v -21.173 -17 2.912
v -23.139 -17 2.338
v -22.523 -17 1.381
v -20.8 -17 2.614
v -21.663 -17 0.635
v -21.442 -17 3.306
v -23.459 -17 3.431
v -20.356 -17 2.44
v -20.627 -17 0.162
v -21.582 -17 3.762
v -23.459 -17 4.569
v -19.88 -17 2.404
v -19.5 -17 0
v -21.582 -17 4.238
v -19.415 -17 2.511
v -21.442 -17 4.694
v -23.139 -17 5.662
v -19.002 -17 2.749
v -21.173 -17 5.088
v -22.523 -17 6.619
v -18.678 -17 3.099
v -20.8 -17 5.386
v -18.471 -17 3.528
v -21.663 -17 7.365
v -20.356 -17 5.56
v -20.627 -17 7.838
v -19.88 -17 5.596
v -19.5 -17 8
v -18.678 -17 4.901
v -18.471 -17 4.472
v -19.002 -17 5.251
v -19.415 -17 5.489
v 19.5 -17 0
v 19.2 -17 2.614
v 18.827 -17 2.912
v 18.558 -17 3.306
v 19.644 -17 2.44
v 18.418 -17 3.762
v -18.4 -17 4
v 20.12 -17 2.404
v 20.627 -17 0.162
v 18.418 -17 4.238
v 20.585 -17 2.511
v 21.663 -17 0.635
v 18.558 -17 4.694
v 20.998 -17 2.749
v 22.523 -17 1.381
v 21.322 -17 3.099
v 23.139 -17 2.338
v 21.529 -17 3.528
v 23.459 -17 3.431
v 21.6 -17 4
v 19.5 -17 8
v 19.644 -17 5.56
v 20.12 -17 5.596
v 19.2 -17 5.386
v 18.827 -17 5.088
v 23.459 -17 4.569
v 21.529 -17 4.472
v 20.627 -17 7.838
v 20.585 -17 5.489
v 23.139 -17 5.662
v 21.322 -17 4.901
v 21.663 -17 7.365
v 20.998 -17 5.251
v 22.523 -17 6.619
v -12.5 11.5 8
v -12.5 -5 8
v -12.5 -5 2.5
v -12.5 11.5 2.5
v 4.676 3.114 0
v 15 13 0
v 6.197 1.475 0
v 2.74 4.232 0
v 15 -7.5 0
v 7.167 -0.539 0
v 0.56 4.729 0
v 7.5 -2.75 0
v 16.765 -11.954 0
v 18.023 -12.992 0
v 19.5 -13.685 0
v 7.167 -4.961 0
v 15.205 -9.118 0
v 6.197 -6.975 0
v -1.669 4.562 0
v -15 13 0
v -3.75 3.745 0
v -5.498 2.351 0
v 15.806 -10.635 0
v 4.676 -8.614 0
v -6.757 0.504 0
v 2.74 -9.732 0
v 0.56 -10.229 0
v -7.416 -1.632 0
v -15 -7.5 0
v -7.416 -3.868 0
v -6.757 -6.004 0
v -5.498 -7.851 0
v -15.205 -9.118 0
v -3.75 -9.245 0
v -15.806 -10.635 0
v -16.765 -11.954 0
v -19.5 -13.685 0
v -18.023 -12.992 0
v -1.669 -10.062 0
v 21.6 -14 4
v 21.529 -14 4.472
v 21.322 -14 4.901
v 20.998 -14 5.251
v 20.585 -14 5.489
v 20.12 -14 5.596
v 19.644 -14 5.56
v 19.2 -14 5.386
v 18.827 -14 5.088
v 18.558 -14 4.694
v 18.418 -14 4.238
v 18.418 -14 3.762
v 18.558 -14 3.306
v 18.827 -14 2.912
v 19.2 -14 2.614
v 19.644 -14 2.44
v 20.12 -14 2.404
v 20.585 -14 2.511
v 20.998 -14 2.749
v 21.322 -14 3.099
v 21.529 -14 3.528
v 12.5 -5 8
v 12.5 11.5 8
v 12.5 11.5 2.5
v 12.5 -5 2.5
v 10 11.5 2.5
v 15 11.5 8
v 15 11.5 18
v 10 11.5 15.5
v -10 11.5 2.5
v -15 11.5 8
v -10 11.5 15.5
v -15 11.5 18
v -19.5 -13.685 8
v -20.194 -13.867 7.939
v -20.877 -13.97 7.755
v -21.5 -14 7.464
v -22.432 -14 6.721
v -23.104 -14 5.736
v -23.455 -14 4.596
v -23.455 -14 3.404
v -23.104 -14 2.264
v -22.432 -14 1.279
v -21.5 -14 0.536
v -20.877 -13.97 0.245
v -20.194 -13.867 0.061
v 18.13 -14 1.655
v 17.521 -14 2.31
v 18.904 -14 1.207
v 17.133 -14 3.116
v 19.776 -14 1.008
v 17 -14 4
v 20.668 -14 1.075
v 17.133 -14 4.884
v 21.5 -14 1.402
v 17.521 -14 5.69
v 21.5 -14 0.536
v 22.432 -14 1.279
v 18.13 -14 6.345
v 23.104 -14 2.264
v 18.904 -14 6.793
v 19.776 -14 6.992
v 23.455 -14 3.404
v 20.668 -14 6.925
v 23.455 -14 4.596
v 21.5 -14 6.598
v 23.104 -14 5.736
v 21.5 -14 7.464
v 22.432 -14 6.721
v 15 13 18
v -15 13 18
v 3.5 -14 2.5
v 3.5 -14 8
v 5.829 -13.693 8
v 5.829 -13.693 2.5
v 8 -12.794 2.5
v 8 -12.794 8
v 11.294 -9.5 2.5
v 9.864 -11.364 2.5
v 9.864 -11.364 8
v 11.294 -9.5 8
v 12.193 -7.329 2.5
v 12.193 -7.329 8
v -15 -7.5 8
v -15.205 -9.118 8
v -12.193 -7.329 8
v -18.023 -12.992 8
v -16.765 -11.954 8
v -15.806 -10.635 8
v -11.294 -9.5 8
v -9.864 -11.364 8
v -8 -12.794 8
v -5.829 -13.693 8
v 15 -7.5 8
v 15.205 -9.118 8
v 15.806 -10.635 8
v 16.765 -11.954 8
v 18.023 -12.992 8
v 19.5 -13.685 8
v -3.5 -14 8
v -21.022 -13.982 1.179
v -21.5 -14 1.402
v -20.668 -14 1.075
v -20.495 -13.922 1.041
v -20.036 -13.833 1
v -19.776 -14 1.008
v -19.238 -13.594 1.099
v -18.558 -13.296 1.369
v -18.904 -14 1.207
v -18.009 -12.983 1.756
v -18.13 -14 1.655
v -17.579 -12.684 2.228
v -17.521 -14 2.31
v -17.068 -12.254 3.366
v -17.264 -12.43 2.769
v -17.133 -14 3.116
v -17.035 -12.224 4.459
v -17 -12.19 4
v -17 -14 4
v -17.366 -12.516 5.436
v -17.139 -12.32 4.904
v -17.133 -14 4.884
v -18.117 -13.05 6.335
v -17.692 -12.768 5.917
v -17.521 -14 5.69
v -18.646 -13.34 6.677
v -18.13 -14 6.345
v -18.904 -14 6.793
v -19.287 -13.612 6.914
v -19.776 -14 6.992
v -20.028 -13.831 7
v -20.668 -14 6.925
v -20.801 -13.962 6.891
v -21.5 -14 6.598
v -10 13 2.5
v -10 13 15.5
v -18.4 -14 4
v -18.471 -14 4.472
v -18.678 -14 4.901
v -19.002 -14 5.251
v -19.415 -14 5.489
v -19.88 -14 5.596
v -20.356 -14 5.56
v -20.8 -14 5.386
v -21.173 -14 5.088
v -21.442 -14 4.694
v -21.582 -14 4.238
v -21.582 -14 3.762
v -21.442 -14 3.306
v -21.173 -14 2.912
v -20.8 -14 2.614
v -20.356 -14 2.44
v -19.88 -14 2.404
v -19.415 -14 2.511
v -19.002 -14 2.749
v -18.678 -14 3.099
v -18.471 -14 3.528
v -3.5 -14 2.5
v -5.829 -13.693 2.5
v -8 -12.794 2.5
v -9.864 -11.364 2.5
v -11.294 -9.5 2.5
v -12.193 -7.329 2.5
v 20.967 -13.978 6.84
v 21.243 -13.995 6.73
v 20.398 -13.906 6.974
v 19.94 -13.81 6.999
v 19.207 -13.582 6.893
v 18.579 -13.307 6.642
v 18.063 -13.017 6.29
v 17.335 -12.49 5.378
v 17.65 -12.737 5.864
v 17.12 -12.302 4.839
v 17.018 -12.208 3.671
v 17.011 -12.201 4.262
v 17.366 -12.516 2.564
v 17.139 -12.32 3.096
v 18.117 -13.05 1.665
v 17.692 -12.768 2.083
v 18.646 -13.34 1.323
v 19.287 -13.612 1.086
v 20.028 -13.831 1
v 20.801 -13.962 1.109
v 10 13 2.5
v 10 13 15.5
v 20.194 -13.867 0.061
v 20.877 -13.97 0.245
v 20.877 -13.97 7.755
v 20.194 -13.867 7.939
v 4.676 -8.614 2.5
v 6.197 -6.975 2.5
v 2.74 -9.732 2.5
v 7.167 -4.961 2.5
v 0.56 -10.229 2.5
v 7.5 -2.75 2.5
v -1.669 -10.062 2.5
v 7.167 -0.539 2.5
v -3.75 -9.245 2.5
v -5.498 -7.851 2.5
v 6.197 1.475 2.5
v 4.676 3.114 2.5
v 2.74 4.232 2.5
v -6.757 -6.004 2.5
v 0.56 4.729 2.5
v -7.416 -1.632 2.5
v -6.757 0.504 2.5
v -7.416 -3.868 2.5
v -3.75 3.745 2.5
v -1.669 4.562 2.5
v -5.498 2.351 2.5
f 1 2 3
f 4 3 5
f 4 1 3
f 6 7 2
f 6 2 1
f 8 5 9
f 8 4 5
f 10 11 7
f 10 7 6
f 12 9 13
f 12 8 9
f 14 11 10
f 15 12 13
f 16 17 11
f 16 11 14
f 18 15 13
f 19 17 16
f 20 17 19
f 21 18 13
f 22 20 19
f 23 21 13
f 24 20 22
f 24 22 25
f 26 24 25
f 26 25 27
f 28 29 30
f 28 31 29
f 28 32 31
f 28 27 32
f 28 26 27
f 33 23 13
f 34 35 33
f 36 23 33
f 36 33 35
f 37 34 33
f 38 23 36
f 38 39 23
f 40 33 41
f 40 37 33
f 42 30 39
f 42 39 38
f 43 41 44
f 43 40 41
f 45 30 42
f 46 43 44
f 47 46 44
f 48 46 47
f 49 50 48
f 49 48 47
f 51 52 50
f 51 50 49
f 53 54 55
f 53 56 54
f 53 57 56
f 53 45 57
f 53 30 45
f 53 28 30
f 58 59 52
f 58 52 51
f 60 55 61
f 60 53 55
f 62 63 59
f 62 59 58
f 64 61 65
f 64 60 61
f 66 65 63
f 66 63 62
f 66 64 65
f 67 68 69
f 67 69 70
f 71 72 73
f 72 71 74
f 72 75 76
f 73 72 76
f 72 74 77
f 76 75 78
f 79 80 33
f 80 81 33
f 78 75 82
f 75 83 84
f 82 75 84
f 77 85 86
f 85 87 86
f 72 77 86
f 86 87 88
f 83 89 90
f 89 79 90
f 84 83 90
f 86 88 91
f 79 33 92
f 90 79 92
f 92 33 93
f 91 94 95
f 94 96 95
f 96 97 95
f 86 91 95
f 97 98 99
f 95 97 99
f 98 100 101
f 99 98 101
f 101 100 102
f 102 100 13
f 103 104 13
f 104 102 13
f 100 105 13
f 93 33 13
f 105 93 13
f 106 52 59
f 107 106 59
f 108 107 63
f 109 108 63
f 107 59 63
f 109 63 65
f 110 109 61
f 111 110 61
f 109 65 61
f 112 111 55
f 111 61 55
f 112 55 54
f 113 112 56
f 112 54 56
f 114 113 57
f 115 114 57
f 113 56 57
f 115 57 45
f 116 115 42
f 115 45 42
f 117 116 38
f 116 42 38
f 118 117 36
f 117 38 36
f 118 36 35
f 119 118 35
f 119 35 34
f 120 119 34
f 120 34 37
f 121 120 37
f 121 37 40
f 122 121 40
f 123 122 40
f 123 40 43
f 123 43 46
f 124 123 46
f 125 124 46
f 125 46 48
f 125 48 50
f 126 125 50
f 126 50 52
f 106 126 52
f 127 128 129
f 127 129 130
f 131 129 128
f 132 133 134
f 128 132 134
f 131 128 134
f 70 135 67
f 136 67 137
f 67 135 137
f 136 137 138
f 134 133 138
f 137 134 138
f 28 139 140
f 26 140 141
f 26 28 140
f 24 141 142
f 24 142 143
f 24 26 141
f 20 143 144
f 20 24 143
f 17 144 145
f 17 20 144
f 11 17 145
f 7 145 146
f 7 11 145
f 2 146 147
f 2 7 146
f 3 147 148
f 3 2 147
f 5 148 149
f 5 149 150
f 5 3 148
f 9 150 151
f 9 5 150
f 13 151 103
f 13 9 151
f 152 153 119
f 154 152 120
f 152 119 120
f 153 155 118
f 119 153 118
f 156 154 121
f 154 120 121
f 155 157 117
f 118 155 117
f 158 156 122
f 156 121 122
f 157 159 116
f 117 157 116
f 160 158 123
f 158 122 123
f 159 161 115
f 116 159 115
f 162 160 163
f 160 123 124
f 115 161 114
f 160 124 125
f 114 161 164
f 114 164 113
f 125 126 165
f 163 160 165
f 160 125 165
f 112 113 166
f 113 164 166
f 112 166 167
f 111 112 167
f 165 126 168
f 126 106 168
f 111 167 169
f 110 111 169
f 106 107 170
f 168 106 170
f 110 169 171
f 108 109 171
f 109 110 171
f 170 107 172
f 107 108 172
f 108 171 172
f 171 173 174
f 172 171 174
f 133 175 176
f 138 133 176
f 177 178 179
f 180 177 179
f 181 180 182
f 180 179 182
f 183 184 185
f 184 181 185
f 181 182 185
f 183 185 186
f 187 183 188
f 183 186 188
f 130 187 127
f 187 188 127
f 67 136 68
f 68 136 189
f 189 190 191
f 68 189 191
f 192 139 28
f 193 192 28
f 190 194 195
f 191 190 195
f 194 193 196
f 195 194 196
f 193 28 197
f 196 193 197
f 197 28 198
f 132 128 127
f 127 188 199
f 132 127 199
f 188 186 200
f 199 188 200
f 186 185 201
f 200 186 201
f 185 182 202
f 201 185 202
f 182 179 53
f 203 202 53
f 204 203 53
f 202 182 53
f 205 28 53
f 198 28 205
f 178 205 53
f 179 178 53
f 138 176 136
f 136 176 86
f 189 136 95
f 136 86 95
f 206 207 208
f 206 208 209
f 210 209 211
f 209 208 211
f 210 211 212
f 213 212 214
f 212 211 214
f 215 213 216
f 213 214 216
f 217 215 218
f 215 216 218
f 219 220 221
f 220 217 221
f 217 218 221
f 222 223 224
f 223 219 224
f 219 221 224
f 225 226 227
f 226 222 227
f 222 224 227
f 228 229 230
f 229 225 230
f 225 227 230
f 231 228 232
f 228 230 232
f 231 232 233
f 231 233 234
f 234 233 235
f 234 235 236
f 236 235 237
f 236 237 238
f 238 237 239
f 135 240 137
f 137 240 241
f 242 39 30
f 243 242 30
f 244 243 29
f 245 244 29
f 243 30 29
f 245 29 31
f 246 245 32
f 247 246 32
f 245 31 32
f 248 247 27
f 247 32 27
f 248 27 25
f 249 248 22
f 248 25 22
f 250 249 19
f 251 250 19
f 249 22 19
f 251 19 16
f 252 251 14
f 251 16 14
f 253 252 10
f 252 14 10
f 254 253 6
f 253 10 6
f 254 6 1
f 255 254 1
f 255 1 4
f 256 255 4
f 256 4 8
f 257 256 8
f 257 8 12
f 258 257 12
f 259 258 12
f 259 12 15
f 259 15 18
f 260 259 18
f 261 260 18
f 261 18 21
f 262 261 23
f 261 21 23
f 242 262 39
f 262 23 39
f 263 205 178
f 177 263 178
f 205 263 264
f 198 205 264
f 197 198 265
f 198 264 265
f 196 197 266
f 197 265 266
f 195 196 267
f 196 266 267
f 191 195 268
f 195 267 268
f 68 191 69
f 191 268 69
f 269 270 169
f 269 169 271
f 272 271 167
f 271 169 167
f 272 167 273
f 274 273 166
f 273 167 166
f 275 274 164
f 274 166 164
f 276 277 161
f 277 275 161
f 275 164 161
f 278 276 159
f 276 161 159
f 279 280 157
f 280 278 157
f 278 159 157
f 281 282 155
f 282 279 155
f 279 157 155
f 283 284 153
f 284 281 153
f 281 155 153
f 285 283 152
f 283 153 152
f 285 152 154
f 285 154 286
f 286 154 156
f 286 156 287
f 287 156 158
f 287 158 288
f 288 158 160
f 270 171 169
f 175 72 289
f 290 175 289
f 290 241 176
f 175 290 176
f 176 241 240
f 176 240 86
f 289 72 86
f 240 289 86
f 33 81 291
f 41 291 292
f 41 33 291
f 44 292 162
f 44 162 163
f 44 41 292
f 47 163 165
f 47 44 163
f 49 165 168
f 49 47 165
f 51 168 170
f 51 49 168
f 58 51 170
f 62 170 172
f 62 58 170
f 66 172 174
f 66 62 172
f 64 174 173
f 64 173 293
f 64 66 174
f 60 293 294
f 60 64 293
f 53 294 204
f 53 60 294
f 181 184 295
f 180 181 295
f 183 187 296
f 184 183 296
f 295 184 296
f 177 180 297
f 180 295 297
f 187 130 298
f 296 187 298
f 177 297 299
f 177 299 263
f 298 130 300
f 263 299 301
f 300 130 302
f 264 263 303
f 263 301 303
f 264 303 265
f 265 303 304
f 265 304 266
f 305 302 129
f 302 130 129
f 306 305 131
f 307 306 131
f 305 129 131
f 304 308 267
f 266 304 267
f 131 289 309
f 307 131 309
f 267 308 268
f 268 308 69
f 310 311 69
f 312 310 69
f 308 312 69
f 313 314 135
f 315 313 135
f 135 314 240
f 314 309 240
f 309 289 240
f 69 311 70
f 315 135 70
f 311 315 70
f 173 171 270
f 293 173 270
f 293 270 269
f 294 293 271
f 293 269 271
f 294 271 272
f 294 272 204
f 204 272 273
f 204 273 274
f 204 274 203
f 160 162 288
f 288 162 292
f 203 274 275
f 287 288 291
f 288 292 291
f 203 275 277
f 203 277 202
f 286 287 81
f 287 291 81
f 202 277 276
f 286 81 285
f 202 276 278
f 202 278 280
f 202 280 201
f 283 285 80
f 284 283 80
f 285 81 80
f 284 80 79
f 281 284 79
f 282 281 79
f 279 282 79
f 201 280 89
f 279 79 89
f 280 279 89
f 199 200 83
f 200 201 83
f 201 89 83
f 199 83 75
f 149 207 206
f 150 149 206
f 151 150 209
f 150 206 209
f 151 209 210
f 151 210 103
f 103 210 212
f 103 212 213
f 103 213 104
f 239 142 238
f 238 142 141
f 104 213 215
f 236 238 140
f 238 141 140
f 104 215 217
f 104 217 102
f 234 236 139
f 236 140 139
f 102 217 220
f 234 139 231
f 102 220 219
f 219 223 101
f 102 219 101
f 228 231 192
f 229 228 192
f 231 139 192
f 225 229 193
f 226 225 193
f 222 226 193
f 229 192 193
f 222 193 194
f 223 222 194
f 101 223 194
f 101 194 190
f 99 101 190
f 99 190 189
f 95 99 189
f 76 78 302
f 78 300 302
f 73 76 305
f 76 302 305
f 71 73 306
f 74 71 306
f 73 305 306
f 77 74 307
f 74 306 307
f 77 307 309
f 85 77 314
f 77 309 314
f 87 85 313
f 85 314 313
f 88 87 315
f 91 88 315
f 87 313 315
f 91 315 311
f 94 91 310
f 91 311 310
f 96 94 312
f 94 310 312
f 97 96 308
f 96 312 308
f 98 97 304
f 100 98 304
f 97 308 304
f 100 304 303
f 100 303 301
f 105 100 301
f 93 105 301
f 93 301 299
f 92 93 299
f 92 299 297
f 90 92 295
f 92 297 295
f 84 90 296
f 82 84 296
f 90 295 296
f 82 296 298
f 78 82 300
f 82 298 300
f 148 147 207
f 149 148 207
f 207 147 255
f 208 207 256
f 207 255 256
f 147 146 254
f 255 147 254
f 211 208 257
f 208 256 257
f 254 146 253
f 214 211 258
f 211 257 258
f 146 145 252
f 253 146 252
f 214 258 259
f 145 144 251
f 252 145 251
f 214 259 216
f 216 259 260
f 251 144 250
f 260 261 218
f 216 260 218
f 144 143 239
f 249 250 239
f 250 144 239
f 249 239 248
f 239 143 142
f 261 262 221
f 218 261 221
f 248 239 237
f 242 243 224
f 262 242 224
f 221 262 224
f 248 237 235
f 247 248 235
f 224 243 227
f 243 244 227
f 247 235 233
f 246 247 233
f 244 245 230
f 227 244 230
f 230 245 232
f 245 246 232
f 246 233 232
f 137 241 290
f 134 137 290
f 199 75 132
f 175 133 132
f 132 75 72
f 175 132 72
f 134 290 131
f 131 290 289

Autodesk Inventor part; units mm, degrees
ref_plane "YZ Plane" through (0, 0, 0) normal (1, 0, 0) x (0, 1, 0)
ref_plane "XZ Plane" through (0, 0, 0) normal (0, 1, 0) x (-1, 0, 0)
ref_plane "XY Plane" through (0, 0, 0) normal (0, 0, 1) x (1, 0, 0)
sketch "スケッチ1" plane through (0, 0, 0) normal (0, 0, 1) x (1, 0, 0)
  line L0 (-59, 0) -> (-38, 0)
  line L1 (-38, 0) -> (-38, -21)
  line L2 (-38, -21) -> (-59, -21)
  line L3 (-59, -21) -> (-59, 0)
  line L4 (-61, 2) -> (-36, 2)
  line L5 (-36, 2) -> (-36, -23)
  line L6 (-36, -23) -> (-61, -23)
  line L7 (-61, -23) -> (-61, 2)
  line L8 (-61, -23) -> (0, -23)
  line L9 (0, -23) -> (0, -17)
  line L10 (0, -17) -> (-61, -17)
  line L11 (-61, -17) -> (-61, -23)
  line L12 (-48.5, -23) -> (-85.5, -23)
  line L13 (-85.5, -23) -> (-85.5, -17)
  line L14 (-85.5, -17) -> (-48.5, -17)
  line L15 (-48.5, -17) -> (-48.5, -23)
  line L16 (-85.5, 1) -> (-82.5, 1)
  line L17 (-82.5, 1) -> (-82.5, -23)
  line L18 (-82.5, -23) -> (-85.5, -23)
  line L19 (-85.5, -23) -> (-85.5, 1)
  line L20 (-85.5, -17) -> (-90.7, -17)
  line L21 (-90.7, -17) -> (-90.7, -23)
  line L22 (-90.7, -23) -> (-85.5, -23)
  line L23 (-85.5, -23) -> (-85.5, -17)
  line L24 (-90.7, -23) -> (-93.7, -23)
  line L25 (-93.7, -23) -> (-93.7, 1)
  line L26 (-93.7, 1) -> (-90.7, 1)
  line L27 (-90.7, 1) -> (-90.7, -23)
  point P0 (0, 0)
  point P1 (-61, -10.5)
  point P2 (-59, -10.5)
  point P3 (-48.5, 2)
  point P4 (-48.5, 0)
  point P5 (-36, -17)
  point P6 (-82.5, -17)
  dimension "d0" = 21
  dimension "d1" = 21
  dimension "d4" = 38
  dimension "d5" = 25
  dimension "d6" = 6
  dimension "d31" = 37
  dimension "d33" = 5.2
  dimension "d34" = 3
  dimension "d35" = 18
extrude "押し出し1" add sketch "スケッチ1" along normal blind 8 contours L10 L9 L8 L5
mirror "ミラー2" about plane through (0, -23, 0) normal (1, 0, 0)
sketch "スケッチ17" plane through (0, 0, 0) normal (0, 0, -1) x (-1, 0, 0)
  line L0 (-15, 13) -> (15, 13)
  line L1 (15, 13) -> (15, -17)
  line L2 (15, -17) -> (-15, -17)
  line L3 (-15, -17) -> (-15, 13)
  line L4 (-36, -17) -> (36, -17) projected
  point P0 (0, 13)
  point P1 (0, 13)
  point P2 (0, -17)
  dimension "d74" = 30
  dimension "d105" = 30
extrude "押し出し16" add sketch "スケッチ17" against normal blind 18
sketch "スケッチ18" plane through (-15, 13, 0) normal (0, 1, 0) x (1, 0, 0)
  line L0 (5, -15.5) -> (25, -15.5)
  line L1 (25, -15.5) -> (25, -2.5)
  line L2 (25, -2.5) -> (5, -2.5)
  line L3 (5, -2.5) -> (5, -15.5)
  line L4 (0, 0) -> (30, 0) projected
  line L5 (0, 0) -> (0, -18) projected
  point P0 (15, 0)
  point P1 (15, -2.5)
  point P2 (15, 0)
  point P3 (5, -9)
  point P4 (0, -9)
  dimension "d77" = 20
  dimension "d78" = 13
extrude "押し出し17" cut sketch "スケッチ18" against normal up to surface (30 mm away)
sketch "スケッチ19" plane through (0, 0, 18) normal (0, 0, 1) x (1, 0, 0)
  line L0 (-15, -17) -> (-15, -23) projected
  line L1 (15, 13) -> (15, -17) projected
  line L2 (-15, -17) -> (15, -17)
  line L3 (15, -17) -> (15, 11.5)
  line L4 (15, 11.5) -> (-15, 11.5)
  line L5 (-15, 11.5) -> (-15, -17)
  line L6 (15, 13) -> (-15, 13) projected
  point P0 (0, 0)
  point P1 (-15, 13)
  point P2 (15, -17)
  dimension "d81" = 1.5
extrude "押し出し18" cut sketch "スケッチ19" against normal up to surface (10 mm away)
sketch "スケッチ20" plane through (-15, 11.5, 8) normal (0, 0, 1) x (1, 0, 0)
  line L0 (0, 0) -> (30, 0) projected
  line L1 (30, -28.5) -> (51, -28.5) projected
  line L2 (2.5, 0) -> (47.5, 0)
  line L3 (40.5, -28.5) -> (2.5, -28.5)
  line L4 (2.5, -28.5) -> (2.5, 0)
  line L5 (5, 0) -> (5, -28.5) projected
  line L6 (25, 0) -> (27.5, 0)
  line L7 (27.5, 0) -> (27.5, -28.5)
  line L8 (27.5, -28.5) -> (25, -28.5)
  line L9 (25, -28.5) -> (25, 0)
  line L10 (25, -28.5) -> (25, 0) projected
  point P0 (15, -11.5)
  point P1 (40.5, -28.5)
  point P2 (25, -15)
  point P3 (5, -15)
  point P4 (51, -28.5)
  point P5 (5, -16)
  point P6 (25, -28.5)
  point P7 (27.5, 0)
  dimension "d85" = 2.5
  dimension "d113" = 2.5
extrude "押し出し19" cut sketch "スケッチ20" against normal up to surface (5.5 mm away) contours L0 L5 L3 L4 | L0 L7 L3 L9
sketch "スケッチ21" plane through (-10, 13, 2.5) normal (0, 0, 1) x (1, 0, 0)
  line L0 (20, 0) -> (20, -1.5) projected
  line L1 (0, 0) -> (20, 0) projected
  line L2 (0, 0) -> (0, -1.5) projected
  line L3 (-2.5, -30) -> (22.5, -30) projected
  circle A0 centre (10, -15.75) radius 7.5
  line L4 (-5, -1.5) -> (25, -1.5) projected
  line L5 (-2.5, -30) -> (-2.5, -1.5) projected
  line L6 (22.5, -30) -> (22.5, -1.5) projected
  line L7 (22.5, -1.5) -> (20, -1.5) projected
  line L8 (0, -1.5) -> (-2.5, -1.5) projected
  line L9 (-2.5, -1.5) -> (-2.5, -30) projected
  point P0 (0, -2)
  point P1 (10, -1.5)
  point P2 (25, -1.5)
  point P3 (-2.5, -15.75)
  dimension "d89" = 15
extrude "押し出し20" cut sketch "スケッチ21" against normal through all contours A0
sketch "スケッチ26" plane through (-36, -23, 0) normal (0, -1, 0) x (1, 0, 0)
  line L0 (0, 0) -> (72, 0) projected
  line L1 (72, 0) -> (72, 8) projected
  line L2 (0, 8) -> (72, 8) projected
  line L3 (0, 0) -> (0, 8) projected
  point P0 (36, 0)
extrude "押し出し25" cut sketch "スケッチ26" against normal up to surface (6 mm away)
sketch "スケッチ27" plane through (-15, -17, 0) normal (0, -1, 0) x (1, 0, 0)
  line L0 (-8.5, 8) -> (38.5, 8)
  line L1 (38.5, 8) -> (38.5, 0)
  line L2 (38.5, 0) -> (-8.5, 0)
  line L3 (-8.5, 0) -> (-8.5, 8)
  line L4 (-5, 8) -> (35, 8)
  line L5 (35, 8) -> (35, 0) construction
  line L6 (35, 0) -> (-5, 0)
  line L7 (-5, 0) -> (-5, 8) construction
  line L8 (0, 8) -> (30, 8) projected
  line L9 (30, 0) -> (0, 0) projected
  circle A0 centre (-5, 4) radius 1.6
  circle A1 centre (35, 4) radius 1.6
  point P0 (15, 0)
  point P1 (10.6, 8)
  point P2 (15, 0)
  point P3 (15, 0)
  dimension "d108" = 40
  dimension "d109" = 47
  dimension "d110" = 3.2
extrude "押し出し26" add sketch "スケッチ27" against normal blind 3
fillet "フィレット6" radius 6.5 2 edges at (-15, -14, 4) (15, -14, 4)
sketch "スケッチ28" plane through (-15, -14, 0) normal (0, 1, 0) x (1, 0, 0)
  circle A0 centre (-5, -4) radius 1.6 projected
  circle A1 centre (35, -4) radius 1.6 projected
  line L0 (-8.5, -8) -> (38.5, -8) projected
  line L1 (-8.5, -8) -> (-8.5, 0) projected
  line L2 (38.5, 0) -> (-8.5, 0) projected
  line L3 (38.5, 0) -> (38.5, -8) projected
  circle A2 centre (35, -4) radius 3
  circle A3 centre (-5, -4) radius 3
  point P0 (15, 0)
  dimension "d116" = 6
extrude "押し出し27" cut sketch "スケッチ28" along normal through all contours A0 | A1 | A2 | A3
fillet "フィレット7" radius 4 4 edges at (-23.5, -15.5, 8) (-23.5, -15.5, 0) (23.5, -15.5, 8) (23.5, -15.5, 0)
fillet "フィレット8" radius 9 2 edges at (12.5, -14, 5.25) (-12.5, -14, 5.25)
equation "\"d0\" = d1"
equation "\"d113\" = d85"
properties part number "スイッチセッター"
